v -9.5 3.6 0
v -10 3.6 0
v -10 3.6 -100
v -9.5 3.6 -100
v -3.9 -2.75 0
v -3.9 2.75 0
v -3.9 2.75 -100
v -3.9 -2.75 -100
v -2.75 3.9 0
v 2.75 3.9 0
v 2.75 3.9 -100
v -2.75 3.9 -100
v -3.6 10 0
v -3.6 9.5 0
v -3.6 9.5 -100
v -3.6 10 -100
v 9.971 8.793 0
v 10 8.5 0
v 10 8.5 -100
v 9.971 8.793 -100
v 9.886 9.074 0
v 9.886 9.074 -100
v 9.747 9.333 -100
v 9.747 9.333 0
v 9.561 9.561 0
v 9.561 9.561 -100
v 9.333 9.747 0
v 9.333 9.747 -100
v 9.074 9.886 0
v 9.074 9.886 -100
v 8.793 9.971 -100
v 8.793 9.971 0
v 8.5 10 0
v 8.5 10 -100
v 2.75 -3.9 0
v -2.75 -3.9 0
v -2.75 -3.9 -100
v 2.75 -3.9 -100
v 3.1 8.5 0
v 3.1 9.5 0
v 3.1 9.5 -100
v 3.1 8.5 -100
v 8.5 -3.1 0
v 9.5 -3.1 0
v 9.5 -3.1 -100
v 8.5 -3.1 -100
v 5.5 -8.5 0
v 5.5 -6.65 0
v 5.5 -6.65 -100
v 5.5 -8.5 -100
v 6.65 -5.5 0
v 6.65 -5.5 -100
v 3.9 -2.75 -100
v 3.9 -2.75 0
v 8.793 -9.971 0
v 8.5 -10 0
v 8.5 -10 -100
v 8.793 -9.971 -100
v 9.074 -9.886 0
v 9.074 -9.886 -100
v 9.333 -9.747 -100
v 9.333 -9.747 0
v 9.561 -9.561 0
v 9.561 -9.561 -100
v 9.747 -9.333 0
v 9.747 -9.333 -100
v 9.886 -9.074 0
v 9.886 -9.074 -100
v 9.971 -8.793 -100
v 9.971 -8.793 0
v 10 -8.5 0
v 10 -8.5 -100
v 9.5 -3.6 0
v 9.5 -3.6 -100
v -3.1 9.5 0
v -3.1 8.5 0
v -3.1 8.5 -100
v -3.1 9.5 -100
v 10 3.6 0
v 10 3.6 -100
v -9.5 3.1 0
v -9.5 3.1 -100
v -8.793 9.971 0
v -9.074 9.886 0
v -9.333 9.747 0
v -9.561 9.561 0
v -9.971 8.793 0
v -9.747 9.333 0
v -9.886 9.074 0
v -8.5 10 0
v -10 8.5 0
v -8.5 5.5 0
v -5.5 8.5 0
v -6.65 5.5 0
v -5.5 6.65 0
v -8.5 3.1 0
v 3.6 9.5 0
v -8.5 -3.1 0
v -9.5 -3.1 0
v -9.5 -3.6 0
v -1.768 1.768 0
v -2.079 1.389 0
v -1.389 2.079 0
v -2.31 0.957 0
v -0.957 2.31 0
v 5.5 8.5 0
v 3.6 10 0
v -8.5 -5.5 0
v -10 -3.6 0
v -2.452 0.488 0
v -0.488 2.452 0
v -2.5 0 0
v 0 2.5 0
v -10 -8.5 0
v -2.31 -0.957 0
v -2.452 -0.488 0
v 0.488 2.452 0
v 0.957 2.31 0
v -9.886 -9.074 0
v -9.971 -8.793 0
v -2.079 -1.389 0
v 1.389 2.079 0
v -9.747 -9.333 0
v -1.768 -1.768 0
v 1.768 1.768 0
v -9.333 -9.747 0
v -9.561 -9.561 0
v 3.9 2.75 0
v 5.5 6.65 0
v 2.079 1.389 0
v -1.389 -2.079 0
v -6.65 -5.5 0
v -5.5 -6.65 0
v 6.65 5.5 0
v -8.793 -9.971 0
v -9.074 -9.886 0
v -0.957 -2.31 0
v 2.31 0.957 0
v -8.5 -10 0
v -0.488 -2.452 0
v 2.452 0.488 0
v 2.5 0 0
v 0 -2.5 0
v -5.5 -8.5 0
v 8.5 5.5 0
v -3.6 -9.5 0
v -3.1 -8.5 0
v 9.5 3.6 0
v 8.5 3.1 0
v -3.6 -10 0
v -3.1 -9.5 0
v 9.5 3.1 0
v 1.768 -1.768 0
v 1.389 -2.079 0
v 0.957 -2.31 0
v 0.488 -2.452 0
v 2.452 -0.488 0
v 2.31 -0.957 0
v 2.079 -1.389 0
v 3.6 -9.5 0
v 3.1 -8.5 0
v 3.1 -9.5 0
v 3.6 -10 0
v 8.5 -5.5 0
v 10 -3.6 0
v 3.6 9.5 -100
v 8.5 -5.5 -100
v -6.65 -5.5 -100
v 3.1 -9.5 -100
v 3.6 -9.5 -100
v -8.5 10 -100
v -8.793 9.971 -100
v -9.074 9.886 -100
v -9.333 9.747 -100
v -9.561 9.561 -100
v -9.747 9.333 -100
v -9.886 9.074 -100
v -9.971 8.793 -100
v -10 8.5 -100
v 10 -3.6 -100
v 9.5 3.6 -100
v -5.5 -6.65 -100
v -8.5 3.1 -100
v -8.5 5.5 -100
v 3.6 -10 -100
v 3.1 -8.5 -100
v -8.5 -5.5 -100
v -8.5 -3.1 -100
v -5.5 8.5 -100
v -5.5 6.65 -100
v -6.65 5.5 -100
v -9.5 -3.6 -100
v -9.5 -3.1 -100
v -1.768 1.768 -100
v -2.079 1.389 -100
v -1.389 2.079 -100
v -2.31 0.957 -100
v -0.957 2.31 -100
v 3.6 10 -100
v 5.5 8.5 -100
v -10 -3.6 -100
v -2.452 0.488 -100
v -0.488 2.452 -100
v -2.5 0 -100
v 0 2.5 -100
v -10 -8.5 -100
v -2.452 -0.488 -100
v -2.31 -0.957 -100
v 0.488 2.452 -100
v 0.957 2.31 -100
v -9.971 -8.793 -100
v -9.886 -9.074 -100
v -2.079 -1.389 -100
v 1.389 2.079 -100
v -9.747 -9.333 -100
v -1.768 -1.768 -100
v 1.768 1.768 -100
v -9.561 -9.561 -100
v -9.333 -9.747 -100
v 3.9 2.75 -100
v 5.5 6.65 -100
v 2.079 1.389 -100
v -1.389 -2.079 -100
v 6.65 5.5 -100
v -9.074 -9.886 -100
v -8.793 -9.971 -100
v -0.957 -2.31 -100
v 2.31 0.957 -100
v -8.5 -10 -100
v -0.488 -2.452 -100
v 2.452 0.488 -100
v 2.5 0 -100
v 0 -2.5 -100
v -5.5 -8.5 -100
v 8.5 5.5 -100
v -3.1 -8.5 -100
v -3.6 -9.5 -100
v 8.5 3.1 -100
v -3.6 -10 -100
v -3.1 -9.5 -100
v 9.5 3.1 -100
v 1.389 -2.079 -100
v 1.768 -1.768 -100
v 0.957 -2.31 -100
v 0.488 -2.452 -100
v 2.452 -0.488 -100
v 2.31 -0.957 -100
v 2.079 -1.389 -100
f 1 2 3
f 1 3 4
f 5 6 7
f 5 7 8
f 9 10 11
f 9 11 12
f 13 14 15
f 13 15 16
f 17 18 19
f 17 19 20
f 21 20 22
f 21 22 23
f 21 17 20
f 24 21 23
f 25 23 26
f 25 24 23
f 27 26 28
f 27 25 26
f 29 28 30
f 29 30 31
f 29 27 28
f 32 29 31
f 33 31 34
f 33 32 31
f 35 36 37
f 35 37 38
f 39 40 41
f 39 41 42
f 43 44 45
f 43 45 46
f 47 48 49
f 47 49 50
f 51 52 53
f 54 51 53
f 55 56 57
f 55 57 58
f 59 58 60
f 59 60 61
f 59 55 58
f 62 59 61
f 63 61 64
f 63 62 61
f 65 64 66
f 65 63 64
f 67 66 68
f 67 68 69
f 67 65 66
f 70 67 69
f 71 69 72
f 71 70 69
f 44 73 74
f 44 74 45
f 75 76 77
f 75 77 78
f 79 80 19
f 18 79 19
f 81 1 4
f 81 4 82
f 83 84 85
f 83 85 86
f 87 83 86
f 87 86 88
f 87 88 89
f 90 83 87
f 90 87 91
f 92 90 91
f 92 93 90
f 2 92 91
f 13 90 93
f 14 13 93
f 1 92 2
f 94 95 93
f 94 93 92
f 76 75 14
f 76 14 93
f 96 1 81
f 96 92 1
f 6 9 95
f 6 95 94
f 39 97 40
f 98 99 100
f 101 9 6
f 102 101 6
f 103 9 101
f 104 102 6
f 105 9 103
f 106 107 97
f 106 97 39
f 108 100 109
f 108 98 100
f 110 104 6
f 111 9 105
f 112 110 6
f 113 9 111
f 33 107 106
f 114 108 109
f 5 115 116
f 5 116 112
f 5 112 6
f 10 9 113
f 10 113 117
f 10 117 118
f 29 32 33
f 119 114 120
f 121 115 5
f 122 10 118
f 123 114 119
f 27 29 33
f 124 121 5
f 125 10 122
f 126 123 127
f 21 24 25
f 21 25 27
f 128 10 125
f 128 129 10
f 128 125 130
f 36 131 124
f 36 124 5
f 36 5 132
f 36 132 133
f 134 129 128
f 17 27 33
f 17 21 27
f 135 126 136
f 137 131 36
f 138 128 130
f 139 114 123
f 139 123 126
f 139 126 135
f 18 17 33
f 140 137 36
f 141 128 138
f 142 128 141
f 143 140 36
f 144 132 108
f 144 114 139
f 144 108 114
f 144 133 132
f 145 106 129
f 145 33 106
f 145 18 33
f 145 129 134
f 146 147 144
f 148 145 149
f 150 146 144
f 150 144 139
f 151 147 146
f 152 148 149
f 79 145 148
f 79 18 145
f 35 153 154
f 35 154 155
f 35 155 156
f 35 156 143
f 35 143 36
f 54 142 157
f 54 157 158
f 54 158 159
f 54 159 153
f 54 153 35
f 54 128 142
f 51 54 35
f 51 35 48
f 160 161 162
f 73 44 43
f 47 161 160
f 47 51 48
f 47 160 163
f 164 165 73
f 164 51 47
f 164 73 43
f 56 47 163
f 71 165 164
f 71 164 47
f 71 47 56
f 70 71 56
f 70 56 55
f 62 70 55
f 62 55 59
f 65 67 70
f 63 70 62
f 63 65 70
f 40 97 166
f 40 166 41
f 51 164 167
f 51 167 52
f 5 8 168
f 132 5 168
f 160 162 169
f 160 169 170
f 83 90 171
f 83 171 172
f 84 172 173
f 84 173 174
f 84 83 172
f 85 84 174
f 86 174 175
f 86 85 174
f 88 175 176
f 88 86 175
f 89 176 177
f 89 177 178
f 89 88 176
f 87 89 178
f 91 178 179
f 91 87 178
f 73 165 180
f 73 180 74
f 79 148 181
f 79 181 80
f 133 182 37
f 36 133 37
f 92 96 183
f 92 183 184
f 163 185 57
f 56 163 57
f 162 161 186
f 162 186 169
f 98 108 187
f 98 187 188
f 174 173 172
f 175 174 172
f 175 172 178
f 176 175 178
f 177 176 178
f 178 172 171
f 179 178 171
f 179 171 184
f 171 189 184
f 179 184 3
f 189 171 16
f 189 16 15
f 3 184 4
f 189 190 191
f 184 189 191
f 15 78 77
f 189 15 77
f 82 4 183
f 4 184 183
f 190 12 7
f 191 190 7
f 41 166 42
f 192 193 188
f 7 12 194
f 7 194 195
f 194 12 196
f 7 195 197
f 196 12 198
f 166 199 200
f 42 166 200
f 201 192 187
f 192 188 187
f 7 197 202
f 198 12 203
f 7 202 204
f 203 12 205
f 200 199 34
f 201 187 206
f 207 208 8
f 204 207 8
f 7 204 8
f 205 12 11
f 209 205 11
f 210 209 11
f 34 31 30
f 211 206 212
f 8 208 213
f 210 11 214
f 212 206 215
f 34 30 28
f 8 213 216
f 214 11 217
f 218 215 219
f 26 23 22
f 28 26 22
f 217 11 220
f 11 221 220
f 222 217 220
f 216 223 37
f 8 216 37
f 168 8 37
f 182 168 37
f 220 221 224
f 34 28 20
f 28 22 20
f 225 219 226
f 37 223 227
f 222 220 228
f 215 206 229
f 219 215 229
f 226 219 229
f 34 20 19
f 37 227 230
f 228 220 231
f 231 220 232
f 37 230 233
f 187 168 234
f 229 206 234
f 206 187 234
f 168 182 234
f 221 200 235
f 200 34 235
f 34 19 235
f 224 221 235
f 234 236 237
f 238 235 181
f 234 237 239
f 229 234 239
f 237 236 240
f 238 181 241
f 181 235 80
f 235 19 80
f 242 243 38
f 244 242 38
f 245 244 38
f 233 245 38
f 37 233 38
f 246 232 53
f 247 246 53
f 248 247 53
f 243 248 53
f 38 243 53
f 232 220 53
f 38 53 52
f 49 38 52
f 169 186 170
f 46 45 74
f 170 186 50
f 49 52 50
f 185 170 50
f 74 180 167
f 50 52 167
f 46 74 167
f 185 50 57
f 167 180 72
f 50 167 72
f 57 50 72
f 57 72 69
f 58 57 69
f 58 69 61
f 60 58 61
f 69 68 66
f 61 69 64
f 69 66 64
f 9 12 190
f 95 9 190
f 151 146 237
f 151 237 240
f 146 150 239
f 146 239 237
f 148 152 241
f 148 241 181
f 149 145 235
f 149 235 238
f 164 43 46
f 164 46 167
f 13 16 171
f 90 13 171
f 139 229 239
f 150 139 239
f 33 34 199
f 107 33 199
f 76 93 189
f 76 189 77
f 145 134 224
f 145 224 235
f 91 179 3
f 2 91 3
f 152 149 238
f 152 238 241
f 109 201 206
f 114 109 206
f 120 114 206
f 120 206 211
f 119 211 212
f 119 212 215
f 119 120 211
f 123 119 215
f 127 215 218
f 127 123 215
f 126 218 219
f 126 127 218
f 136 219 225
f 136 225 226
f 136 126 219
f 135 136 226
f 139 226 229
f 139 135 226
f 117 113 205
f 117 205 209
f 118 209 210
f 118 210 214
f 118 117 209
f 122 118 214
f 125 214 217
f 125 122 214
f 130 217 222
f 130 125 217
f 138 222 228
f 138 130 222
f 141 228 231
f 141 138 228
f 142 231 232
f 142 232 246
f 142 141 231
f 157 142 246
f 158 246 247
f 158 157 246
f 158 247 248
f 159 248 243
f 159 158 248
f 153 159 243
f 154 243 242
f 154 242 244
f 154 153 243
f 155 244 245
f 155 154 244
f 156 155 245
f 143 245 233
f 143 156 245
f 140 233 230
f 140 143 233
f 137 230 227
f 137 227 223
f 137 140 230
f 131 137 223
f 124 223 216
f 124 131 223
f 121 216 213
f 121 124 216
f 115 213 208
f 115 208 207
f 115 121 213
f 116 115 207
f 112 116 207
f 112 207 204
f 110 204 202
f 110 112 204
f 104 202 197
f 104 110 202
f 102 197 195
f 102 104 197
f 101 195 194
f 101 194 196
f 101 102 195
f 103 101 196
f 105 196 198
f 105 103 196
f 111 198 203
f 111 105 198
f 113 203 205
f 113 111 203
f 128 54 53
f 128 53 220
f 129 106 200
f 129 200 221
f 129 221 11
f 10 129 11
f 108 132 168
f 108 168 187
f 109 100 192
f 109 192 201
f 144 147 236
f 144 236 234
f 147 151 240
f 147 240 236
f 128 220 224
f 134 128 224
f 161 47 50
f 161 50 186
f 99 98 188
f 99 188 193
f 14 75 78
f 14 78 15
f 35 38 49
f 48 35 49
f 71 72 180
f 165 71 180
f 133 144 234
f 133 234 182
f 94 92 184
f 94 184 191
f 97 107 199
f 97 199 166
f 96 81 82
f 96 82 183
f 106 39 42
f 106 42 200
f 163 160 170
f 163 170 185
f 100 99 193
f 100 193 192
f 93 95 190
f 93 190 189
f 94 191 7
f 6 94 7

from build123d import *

# Parameters (mm, degrees)
SKETCH1_R                = 2.5
F_20_X_20_X_R1_5_1_DEPTH = 100


with BuildPart() as part:
    # Sketch1 → 铝型材 20 X 20 X R1.5(1) (new body)
    with BuildSketch(Plane.YX):
        with BuildLine():
            Line((-3.6, 10), (-3.6, 9.5))
            Line((-3.6, 9.5), (-3.1, 9.5))
            Line((-3.1, 9.5), (-3.1, 8.5))
            Line((-3.1, 8.5), (-5.5, 8.5))
            Line((-5.5, 8.5), (-5.5, 6.65))
            Line((-5.5, 6.65), (-2.75, 3.9))
            Line((-2.75, 3.9), (2.75, 3.9))
            Line((2.75, 3.9), (5.5, 6.65))
            Line((5.5, 6.65), (5.5, 8.5))
            Line((5.5, 8.5), (3.1, 8.5))
            Line((3.1, 8.5), (3.1, 9.5))
            Line((3.1, 9.5), (3.6, 9.5))
            Line((3.6, 9.5), (3.6, 10))
            Line((3.6, 10), (8.5, 10))
            ThreePointArc((8.5, 10), (9.560660172, 9.560660172), (10, 8.5))
            Line((10, 8.5), (10, 3.6))
            Line((10, 3.6), (9.5, 3.6))
            Line((9.5, 3.6), (9.5, 3.1))
            Line((9.5, 3.1), (8.5, 3.1))
            Line((8.5, 3.1), (8.5, 5.5))
            Line((8.5, 5.5), (6.65, 5.5))
            Line((6.65, 5.5), (3.9, 2.75))
            Line((3.9, 2.75), (3.9, -2.75))
            Line((3.9, -2.75), (6.65, -5.5))
            Line((6.65, -5.5), (8.5, -5.5))
            Line((8.5, -5.5), (8.5, -3.1))
            Line((8.5, -3.1), (9.5, -3.1))
            Line((9.5, -3.1), (9.5, -3.6))
            Line((9.5, -3.6), (10, -3.6))
            Line((10, -3.6), (10, -8.5))
            ThreePointArc((10, -8.5), (9.560660172, -9.560660172), (8.5, -10))
            Line((8.5, -10), (3.6, -10))
            Line((3.6, -10), (3.6, -9.5))
            Line((3.6, -9.5), (3.1, -9.5))
            Line((3.1, -9.5), (3.1, -8.5))
            Line((3.1, -8.5), (5.5, -8.5))
            Line((5.5, -8.5), (5.5, -6.65))
            Line((5.5, -6.65), (2.75, -3.9))
            Line((2.75, -3.9), (-2.75, -3.9))
            Line((-2.75, -3.9), (-5.5, -6.65))
            Line((-5.5, -6.65), (-5.5, -8.5))
            Line((-5.5, -8.5), (-3.1, -8.5))
            Line((-3.1, -8.5), (-3.1, -9.5))
            Line((-3.1, -9.5), (-3.6, -9.5))
            Line((-3.6, -9.5), (-3.6, -10))
            Line((-3.6, -10), (-8.5, -10))
            ThreePointArc((-8.5, -10), (-9.560660172, -9.560660172), (-10, -8.5))
            Line((-10, -8.5), (-10, -3.6))
            Line((-10, -3.6), (-9.5, -3.6))
            Line((-9.5, -3.6), (-9.5, -3.1))
            Line((-9.5, -3.1), (-8.5, -3.1))
            Line((-8.5, -3.1), (-8.5, -5.5))
            Line((-8.5, -5.5), (-6.65, -5.5))
            Line((-6.65, -5.5), (-3.9, -2.75))
            Line((-3.9, -2.75), (-3.9, 2.75))
            Line((-3.9, 2.75), (-6.65, 5.5))
            Line((-6.65, 5.5), (-8.5, 5.5))
            Line((-8.5, 5.5), (-8.5, 3.1))
            Line((-8.5, 3.1), (-9.5, 3.1))
            Line((-9.5, 3.1), (-9.5, 3.6))
            Line((-9.5, 3.6), (-10, 3.6))
            Line((-10, 3.6), (-10, 8.5))
            ThreePointArc((-10, 8.5), (-9.560660172, 9.560660172), (-8.5, 10))
            Line((-8.5, 10), (-3.6, 10))
        make_face()
        Circle(SKETCH1_R, mode=Mode.SUBTRACT)
    extrude(amount=F_20_X_20_X_R1_5_1_DEPTH)


solid = part.part
